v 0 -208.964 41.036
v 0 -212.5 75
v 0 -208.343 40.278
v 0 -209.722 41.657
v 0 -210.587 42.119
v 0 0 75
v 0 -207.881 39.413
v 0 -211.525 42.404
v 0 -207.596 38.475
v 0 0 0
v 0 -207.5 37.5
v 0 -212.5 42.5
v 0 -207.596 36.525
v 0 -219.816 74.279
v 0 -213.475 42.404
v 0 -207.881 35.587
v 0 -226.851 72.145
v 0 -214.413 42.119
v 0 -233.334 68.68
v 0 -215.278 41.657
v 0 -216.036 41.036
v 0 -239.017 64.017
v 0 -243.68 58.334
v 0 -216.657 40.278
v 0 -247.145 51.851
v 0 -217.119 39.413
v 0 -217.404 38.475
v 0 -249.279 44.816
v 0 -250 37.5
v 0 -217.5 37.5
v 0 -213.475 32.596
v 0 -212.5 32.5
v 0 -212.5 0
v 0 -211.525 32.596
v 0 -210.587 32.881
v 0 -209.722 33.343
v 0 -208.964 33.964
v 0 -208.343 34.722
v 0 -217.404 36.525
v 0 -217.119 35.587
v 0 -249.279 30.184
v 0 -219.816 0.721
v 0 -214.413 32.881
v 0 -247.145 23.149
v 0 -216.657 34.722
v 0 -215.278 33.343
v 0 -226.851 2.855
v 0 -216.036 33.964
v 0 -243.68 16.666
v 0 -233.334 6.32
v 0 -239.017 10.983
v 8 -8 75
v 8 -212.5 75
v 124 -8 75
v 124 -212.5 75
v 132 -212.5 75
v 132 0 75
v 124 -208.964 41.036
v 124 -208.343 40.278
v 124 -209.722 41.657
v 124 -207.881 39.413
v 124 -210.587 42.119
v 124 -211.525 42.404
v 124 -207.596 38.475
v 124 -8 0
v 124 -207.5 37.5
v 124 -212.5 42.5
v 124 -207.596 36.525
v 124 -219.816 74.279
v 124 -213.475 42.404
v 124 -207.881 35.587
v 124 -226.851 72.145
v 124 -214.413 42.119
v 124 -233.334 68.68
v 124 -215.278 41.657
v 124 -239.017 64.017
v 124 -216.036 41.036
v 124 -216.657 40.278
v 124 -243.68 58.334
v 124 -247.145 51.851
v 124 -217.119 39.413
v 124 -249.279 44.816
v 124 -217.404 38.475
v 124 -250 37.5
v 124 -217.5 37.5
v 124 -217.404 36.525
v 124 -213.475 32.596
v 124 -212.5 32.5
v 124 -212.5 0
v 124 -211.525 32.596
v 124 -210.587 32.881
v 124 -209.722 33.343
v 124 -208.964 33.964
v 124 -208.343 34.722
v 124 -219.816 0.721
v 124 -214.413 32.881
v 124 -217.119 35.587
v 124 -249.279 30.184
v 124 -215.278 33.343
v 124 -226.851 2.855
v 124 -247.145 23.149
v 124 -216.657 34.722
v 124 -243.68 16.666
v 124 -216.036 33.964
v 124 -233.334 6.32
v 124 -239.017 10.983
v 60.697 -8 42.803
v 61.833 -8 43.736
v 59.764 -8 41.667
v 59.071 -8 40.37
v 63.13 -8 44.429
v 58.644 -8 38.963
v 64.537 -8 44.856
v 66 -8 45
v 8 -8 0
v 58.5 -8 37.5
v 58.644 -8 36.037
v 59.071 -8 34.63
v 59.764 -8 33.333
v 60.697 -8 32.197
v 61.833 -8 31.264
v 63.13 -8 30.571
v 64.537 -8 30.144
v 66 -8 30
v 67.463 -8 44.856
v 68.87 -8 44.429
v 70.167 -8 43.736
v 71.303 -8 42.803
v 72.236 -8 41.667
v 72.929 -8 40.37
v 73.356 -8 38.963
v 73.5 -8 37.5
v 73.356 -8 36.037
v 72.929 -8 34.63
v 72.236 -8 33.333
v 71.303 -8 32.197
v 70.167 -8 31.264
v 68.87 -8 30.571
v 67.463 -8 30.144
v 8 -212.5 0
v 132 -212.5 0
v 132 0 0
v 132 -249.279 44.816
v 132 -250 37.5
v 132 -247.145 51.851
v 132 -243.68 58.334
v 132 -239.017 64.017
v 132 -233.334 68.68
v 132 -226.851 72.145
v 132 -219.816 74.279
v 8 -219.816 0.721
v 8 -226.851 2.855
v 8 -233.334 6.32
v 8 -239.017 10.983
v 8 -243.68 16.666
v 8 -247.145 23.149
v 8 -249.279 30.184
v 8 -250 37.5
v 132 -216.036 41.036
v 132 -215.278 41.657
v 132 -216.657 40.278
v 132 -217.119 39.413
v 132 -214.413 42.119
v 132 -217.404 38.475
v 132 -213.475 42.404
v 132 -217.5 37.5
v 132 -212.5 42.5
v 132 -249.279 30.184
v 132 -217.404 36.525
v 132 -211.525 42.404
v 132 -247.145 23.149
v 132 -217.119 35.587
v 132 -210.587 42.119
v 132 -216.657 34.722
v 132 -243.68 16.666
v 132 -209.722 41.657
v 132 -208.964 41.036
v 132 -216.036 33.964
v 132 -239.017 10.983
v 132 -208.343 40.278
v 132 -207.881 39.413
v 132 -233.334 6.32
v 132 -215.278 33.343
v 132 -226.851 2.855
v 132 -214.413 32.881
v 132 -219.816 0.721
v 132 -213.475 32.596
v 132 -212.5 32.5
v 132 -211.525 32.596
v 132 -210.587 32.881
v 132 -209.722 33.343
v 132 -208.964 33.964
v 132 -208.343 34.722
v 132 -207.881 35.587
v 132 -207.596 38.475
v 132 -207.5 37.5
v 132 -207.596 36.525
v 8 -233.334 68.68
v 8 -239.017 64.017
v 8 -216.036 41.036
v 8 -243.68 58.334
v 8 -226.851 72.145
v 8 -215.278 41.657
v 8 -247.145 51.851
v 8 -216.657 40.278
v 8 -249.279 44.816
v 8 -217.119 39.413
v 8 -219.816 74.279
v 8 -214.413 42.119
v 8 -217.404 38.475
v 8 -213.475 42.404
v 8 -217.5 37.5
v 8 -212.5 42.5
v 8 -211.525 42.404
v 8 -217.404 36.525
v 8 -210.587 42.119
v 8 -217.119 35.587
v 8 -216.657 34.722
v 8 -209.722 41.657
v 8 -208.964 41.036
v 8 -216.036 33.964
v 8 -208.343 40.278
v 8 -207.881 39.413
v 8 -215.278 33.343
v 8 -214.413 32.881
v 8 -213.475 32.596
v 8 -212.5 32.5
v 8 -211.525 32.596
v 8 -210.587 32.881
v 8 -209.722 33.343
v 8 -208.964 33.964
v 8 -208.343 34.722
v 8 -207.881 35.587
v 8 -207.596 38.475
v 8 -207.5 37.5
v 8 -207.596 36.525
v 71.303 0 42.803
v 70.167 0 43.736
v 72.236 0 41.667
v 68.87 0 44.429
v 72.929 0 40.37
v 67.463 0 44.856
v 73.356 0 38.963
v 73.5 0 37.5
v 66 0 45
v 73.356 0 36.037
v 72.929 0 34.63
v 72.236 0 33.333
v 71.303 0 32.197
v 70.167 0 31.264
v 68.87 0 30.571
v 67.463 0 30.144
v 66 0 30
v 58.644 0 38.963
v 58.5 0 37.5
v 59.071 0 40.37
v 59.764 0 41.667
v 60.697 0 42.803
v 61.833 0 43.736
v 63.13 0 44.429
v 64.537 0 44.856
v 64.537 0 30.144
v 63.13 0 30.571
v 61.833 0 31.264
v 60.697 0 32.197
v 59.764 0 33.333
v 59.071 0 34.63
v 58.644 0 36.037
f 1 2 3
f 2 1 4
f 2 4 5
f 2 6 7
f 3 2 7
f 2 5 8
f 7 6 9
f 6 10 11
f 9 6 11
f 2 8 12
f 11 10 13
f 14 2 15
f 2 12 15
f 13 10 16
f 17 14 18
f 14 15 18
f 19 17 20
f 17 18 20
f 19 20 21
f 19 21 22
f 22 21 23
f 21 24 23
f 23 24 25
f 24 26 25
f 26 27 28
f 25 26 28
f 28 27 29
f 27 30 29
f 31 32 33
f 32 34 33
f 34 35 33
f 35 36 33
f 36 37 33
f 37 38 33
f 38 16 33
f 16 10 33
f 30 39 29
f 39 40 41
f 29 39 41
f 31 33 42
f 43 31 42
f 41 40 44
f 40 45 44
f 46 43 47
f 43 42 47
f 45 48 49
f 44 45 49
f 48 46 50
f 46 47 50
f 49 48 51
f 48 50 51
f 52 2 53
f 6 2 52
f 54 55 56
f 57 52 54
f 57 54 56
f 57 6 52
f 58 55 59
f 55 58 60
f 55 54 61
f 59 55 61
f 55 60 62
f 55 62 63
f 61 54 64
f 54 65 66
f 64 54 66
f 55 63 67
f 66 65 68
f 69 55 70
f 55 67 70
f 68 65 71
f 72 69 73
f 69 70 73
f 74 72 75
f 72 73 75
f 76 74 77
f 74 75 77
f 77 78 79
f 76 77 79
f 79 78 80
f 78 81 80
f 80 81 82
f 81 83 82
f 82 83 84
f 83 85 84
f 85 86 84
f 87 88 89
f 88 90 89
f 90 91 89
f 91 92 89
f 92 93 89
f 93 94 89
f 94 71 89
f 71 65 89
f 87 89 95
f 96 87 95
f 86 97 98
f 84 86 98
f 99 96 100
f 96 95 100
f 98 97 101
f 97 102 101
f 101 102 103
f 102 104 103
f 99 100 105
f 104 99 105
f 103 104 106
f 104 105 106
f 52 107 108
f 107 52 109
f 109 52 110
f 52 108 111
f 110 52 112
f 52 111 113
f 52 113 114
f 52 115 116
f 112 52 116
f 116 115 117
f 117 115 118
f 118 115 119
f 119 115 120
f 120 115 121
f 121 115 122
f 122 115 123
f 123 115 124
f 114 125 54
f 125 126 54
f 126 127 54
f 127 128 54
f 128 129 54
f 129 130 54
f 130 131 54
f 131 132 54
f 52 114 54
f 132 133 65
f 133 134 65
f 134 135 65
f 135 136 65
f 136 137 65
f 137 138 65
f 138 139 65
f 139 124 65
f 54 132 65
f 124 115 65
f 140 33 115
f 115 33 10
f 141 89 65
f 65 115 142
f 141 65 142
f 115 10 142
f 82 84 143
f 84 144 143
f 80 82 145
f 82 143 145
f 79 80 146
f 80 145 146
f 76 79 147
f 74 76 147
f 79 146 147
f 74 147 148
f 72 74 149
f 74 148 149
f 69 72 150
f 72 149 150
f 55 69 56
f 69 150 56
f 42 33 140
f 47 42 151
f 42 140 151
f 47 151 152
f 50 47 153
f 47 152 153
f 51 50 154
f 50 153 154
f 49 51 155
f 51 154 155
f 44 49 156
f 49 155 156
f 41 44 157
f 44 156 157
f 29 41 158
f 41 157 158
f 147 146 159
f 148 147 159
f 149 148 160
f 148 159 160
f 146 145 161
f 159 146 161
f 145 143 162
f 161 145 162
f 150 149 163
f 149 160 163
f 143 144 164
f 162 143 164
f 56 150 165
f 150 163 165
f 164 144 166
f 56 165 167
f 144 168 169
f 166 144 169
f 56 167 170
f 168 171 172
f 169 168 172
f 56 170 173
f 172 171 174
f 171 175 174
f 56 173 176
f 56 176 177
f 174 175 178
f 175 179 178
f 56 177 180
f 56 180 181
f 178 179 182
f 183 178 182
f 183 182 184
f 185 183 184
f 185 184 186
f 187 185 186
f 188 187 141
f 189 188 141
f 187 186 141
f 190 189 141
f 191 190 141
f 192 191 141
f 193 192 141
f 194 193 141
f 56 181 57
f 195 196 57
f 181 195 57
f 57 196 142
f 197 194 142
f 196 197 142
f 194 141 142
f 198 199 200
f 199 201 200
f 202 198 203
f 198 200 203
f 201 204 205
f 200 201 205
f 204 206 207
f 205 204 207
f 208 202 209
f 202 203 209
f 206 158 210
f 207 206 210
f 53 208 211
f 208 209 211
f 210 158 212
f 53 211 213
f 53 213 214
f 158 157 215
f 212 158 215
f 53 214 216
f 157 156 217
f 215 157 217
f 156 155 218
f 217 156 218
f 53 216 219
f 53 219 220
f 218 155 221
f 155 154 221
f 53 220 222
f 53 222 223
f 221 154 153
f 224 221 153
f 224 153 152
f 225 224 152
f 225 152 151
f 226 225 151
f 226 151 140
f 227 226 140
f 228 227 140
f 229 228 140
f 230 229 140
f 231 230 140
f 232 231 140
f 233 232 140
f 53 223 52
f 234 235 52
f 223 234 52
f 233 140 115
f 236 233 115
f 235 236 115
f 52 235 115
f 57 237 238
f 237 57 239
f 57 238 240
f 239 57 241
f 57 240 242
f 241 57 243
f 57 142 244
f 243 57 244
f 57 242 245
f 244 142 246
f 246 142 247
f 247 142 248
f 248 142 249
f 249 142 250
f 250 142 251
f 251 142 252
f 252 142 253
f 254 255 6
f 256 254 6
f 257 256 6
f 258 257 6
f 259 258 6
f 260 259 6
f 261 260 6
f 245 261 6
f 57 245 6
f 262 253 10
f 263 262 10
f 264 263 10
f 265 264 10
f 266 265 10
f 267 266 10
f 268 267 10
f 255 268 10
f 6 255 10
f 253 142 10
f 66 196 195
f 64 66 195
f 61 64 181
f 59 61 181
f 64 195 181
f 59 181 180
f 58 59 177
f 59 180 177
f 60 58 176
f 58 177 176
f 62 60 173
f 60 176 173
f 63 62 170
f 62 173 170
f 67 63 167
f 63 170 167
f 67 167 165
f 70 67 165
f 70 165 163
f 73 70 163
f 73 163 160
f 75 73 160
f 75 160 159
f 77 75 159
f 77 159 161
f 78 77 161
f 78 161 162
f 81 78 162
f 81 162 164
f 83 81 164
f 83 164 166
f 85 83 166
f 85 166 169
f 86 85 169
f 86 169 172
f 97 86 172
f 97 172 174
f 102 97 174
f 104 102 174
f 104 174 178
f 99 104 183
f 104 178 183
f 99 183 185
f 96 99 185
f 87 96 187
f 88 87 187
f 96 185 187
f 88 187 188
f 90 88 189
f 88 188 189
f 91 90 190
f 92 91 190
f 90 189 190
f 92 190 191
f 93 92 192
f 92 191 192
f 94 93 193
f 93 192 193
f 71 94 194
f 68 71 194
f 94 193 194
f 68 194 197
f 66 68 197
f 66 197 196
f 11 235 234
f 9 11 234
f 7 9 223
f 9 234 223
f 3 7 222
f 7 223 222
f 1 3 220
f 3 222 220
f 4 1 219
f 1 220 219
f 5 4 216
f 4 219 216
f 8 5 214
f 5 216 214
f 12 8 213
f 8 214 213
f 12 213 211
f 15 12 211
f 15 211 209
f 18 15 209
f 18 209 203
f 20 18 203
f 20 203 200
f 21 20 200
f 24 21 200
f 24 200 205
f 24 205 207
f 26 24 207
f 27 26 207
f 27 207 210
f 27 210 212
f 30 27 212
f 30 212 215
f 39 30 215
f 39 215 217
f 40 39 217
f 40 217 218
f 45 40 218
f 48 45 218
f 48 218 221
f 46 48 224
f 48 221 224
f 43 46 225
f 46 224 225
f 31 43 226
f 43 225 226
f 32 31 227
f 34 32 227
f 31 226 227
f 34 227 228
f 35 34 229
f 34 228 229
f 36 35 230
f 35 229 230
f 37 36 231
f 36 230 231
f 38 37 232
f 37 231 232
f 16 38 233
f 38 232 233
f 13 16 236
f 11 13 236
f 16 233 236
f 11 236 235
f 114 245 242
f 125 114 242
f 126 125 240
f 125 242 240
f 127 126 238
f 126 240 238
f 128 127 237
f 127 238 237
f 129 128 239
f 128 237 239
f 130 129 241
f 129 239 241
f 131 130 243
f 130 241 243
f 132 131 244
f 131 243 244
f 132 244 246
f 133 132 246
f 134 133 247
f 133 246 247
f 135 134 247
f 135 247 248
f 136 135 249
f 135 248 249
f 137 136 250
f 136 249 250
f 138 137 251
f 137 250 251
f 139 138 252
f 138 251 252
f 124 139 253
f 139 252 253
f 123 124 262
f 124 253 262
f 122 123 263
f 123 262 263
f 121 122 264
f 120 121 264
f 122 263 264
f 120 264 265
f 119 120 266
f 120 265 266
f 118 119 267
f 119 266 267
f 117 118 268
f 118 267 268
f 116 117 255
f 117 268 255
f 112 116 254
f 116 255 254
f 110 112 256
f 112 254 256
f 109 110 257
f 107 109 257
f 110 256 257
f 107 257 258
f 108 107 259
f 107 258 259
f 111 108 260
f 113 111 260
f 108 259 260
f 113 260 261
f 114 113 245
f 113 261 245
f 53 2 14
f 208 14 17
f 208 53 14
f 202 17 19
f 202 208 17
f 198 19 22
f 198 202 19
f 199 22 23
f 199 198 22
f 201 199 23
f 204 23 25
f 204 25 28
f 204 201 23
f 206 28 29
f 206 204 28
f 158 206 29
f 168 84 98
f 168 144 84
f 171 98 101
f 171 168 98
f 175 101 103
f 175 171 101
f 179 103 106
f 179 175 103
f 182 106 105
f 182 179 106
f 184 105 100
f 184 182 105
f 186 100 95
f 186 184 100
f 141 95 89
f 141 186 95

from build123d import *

# Parameters (mm, degrees)
BOSS_EXTRUDE1_DEPTH = 75
SKETCH2_R           = 7.5
CUT_EXTRUDE1_DEPTH  = 8
SKETCH3_R           = 5
CUT_EXTRUDE2_DEPTH  = 134
FILLET1_R           = 37.5


with BuildPart() as part:
    # Sketch1 → Boss-Extrude1 (new body)
    with BuildSketch(Plane.XY):
        Polygon((124, -250), (132, -250), (132, 0), (0, 0), (0, -250), (8, -250), (8, -8), (124, -8), align=None)
    extrude(amount=BOSS_EXTRUDE1_DEPTH)

    # Sketch2 → Cut-Extrude1 (cut)
    with BuildSketch(Plane(origin=(0, 0, 0), x_dir=(1, 0, 0), z_dir=(0, 1, 0))):
        with Locations(Location((66, -37.5, 0), (0, 0, 270))):
            Circle(SKETCH2_R)
    extrude(amount=-CUT_EXTRUDE1_DEPTH, mode=Mode.SUBTRACT)

    # Sketch3 → Cut-Extrude2 (cut)
    with BuildSketch(Plane(origin=(132, 0, 0), x_dir=(0, 0, -1), z_dir=(1, 0, 0))):
        with Locations(Location((-37.5, -212.5, 0), (0, 0, 90))):
            Circle(SKETCH3_R)
    extrude(amount=-CUT_EXTRUDE2_DEPTH, mode=Mode.SUBTRACT)

    # Fillet1
    fillet1_edges = [part.edges().sort_by_distance(p)[0] for p in [
        (128, -250, 75),
        (4, -250, 75),
        (4, -250, 0),
        (128, -250, 0),
    ]]
    fillet(fillet1_edges, radius=FILLET1_R - 0.0001)  # a hair under: the kernel refuses the full size


solid = part.part
